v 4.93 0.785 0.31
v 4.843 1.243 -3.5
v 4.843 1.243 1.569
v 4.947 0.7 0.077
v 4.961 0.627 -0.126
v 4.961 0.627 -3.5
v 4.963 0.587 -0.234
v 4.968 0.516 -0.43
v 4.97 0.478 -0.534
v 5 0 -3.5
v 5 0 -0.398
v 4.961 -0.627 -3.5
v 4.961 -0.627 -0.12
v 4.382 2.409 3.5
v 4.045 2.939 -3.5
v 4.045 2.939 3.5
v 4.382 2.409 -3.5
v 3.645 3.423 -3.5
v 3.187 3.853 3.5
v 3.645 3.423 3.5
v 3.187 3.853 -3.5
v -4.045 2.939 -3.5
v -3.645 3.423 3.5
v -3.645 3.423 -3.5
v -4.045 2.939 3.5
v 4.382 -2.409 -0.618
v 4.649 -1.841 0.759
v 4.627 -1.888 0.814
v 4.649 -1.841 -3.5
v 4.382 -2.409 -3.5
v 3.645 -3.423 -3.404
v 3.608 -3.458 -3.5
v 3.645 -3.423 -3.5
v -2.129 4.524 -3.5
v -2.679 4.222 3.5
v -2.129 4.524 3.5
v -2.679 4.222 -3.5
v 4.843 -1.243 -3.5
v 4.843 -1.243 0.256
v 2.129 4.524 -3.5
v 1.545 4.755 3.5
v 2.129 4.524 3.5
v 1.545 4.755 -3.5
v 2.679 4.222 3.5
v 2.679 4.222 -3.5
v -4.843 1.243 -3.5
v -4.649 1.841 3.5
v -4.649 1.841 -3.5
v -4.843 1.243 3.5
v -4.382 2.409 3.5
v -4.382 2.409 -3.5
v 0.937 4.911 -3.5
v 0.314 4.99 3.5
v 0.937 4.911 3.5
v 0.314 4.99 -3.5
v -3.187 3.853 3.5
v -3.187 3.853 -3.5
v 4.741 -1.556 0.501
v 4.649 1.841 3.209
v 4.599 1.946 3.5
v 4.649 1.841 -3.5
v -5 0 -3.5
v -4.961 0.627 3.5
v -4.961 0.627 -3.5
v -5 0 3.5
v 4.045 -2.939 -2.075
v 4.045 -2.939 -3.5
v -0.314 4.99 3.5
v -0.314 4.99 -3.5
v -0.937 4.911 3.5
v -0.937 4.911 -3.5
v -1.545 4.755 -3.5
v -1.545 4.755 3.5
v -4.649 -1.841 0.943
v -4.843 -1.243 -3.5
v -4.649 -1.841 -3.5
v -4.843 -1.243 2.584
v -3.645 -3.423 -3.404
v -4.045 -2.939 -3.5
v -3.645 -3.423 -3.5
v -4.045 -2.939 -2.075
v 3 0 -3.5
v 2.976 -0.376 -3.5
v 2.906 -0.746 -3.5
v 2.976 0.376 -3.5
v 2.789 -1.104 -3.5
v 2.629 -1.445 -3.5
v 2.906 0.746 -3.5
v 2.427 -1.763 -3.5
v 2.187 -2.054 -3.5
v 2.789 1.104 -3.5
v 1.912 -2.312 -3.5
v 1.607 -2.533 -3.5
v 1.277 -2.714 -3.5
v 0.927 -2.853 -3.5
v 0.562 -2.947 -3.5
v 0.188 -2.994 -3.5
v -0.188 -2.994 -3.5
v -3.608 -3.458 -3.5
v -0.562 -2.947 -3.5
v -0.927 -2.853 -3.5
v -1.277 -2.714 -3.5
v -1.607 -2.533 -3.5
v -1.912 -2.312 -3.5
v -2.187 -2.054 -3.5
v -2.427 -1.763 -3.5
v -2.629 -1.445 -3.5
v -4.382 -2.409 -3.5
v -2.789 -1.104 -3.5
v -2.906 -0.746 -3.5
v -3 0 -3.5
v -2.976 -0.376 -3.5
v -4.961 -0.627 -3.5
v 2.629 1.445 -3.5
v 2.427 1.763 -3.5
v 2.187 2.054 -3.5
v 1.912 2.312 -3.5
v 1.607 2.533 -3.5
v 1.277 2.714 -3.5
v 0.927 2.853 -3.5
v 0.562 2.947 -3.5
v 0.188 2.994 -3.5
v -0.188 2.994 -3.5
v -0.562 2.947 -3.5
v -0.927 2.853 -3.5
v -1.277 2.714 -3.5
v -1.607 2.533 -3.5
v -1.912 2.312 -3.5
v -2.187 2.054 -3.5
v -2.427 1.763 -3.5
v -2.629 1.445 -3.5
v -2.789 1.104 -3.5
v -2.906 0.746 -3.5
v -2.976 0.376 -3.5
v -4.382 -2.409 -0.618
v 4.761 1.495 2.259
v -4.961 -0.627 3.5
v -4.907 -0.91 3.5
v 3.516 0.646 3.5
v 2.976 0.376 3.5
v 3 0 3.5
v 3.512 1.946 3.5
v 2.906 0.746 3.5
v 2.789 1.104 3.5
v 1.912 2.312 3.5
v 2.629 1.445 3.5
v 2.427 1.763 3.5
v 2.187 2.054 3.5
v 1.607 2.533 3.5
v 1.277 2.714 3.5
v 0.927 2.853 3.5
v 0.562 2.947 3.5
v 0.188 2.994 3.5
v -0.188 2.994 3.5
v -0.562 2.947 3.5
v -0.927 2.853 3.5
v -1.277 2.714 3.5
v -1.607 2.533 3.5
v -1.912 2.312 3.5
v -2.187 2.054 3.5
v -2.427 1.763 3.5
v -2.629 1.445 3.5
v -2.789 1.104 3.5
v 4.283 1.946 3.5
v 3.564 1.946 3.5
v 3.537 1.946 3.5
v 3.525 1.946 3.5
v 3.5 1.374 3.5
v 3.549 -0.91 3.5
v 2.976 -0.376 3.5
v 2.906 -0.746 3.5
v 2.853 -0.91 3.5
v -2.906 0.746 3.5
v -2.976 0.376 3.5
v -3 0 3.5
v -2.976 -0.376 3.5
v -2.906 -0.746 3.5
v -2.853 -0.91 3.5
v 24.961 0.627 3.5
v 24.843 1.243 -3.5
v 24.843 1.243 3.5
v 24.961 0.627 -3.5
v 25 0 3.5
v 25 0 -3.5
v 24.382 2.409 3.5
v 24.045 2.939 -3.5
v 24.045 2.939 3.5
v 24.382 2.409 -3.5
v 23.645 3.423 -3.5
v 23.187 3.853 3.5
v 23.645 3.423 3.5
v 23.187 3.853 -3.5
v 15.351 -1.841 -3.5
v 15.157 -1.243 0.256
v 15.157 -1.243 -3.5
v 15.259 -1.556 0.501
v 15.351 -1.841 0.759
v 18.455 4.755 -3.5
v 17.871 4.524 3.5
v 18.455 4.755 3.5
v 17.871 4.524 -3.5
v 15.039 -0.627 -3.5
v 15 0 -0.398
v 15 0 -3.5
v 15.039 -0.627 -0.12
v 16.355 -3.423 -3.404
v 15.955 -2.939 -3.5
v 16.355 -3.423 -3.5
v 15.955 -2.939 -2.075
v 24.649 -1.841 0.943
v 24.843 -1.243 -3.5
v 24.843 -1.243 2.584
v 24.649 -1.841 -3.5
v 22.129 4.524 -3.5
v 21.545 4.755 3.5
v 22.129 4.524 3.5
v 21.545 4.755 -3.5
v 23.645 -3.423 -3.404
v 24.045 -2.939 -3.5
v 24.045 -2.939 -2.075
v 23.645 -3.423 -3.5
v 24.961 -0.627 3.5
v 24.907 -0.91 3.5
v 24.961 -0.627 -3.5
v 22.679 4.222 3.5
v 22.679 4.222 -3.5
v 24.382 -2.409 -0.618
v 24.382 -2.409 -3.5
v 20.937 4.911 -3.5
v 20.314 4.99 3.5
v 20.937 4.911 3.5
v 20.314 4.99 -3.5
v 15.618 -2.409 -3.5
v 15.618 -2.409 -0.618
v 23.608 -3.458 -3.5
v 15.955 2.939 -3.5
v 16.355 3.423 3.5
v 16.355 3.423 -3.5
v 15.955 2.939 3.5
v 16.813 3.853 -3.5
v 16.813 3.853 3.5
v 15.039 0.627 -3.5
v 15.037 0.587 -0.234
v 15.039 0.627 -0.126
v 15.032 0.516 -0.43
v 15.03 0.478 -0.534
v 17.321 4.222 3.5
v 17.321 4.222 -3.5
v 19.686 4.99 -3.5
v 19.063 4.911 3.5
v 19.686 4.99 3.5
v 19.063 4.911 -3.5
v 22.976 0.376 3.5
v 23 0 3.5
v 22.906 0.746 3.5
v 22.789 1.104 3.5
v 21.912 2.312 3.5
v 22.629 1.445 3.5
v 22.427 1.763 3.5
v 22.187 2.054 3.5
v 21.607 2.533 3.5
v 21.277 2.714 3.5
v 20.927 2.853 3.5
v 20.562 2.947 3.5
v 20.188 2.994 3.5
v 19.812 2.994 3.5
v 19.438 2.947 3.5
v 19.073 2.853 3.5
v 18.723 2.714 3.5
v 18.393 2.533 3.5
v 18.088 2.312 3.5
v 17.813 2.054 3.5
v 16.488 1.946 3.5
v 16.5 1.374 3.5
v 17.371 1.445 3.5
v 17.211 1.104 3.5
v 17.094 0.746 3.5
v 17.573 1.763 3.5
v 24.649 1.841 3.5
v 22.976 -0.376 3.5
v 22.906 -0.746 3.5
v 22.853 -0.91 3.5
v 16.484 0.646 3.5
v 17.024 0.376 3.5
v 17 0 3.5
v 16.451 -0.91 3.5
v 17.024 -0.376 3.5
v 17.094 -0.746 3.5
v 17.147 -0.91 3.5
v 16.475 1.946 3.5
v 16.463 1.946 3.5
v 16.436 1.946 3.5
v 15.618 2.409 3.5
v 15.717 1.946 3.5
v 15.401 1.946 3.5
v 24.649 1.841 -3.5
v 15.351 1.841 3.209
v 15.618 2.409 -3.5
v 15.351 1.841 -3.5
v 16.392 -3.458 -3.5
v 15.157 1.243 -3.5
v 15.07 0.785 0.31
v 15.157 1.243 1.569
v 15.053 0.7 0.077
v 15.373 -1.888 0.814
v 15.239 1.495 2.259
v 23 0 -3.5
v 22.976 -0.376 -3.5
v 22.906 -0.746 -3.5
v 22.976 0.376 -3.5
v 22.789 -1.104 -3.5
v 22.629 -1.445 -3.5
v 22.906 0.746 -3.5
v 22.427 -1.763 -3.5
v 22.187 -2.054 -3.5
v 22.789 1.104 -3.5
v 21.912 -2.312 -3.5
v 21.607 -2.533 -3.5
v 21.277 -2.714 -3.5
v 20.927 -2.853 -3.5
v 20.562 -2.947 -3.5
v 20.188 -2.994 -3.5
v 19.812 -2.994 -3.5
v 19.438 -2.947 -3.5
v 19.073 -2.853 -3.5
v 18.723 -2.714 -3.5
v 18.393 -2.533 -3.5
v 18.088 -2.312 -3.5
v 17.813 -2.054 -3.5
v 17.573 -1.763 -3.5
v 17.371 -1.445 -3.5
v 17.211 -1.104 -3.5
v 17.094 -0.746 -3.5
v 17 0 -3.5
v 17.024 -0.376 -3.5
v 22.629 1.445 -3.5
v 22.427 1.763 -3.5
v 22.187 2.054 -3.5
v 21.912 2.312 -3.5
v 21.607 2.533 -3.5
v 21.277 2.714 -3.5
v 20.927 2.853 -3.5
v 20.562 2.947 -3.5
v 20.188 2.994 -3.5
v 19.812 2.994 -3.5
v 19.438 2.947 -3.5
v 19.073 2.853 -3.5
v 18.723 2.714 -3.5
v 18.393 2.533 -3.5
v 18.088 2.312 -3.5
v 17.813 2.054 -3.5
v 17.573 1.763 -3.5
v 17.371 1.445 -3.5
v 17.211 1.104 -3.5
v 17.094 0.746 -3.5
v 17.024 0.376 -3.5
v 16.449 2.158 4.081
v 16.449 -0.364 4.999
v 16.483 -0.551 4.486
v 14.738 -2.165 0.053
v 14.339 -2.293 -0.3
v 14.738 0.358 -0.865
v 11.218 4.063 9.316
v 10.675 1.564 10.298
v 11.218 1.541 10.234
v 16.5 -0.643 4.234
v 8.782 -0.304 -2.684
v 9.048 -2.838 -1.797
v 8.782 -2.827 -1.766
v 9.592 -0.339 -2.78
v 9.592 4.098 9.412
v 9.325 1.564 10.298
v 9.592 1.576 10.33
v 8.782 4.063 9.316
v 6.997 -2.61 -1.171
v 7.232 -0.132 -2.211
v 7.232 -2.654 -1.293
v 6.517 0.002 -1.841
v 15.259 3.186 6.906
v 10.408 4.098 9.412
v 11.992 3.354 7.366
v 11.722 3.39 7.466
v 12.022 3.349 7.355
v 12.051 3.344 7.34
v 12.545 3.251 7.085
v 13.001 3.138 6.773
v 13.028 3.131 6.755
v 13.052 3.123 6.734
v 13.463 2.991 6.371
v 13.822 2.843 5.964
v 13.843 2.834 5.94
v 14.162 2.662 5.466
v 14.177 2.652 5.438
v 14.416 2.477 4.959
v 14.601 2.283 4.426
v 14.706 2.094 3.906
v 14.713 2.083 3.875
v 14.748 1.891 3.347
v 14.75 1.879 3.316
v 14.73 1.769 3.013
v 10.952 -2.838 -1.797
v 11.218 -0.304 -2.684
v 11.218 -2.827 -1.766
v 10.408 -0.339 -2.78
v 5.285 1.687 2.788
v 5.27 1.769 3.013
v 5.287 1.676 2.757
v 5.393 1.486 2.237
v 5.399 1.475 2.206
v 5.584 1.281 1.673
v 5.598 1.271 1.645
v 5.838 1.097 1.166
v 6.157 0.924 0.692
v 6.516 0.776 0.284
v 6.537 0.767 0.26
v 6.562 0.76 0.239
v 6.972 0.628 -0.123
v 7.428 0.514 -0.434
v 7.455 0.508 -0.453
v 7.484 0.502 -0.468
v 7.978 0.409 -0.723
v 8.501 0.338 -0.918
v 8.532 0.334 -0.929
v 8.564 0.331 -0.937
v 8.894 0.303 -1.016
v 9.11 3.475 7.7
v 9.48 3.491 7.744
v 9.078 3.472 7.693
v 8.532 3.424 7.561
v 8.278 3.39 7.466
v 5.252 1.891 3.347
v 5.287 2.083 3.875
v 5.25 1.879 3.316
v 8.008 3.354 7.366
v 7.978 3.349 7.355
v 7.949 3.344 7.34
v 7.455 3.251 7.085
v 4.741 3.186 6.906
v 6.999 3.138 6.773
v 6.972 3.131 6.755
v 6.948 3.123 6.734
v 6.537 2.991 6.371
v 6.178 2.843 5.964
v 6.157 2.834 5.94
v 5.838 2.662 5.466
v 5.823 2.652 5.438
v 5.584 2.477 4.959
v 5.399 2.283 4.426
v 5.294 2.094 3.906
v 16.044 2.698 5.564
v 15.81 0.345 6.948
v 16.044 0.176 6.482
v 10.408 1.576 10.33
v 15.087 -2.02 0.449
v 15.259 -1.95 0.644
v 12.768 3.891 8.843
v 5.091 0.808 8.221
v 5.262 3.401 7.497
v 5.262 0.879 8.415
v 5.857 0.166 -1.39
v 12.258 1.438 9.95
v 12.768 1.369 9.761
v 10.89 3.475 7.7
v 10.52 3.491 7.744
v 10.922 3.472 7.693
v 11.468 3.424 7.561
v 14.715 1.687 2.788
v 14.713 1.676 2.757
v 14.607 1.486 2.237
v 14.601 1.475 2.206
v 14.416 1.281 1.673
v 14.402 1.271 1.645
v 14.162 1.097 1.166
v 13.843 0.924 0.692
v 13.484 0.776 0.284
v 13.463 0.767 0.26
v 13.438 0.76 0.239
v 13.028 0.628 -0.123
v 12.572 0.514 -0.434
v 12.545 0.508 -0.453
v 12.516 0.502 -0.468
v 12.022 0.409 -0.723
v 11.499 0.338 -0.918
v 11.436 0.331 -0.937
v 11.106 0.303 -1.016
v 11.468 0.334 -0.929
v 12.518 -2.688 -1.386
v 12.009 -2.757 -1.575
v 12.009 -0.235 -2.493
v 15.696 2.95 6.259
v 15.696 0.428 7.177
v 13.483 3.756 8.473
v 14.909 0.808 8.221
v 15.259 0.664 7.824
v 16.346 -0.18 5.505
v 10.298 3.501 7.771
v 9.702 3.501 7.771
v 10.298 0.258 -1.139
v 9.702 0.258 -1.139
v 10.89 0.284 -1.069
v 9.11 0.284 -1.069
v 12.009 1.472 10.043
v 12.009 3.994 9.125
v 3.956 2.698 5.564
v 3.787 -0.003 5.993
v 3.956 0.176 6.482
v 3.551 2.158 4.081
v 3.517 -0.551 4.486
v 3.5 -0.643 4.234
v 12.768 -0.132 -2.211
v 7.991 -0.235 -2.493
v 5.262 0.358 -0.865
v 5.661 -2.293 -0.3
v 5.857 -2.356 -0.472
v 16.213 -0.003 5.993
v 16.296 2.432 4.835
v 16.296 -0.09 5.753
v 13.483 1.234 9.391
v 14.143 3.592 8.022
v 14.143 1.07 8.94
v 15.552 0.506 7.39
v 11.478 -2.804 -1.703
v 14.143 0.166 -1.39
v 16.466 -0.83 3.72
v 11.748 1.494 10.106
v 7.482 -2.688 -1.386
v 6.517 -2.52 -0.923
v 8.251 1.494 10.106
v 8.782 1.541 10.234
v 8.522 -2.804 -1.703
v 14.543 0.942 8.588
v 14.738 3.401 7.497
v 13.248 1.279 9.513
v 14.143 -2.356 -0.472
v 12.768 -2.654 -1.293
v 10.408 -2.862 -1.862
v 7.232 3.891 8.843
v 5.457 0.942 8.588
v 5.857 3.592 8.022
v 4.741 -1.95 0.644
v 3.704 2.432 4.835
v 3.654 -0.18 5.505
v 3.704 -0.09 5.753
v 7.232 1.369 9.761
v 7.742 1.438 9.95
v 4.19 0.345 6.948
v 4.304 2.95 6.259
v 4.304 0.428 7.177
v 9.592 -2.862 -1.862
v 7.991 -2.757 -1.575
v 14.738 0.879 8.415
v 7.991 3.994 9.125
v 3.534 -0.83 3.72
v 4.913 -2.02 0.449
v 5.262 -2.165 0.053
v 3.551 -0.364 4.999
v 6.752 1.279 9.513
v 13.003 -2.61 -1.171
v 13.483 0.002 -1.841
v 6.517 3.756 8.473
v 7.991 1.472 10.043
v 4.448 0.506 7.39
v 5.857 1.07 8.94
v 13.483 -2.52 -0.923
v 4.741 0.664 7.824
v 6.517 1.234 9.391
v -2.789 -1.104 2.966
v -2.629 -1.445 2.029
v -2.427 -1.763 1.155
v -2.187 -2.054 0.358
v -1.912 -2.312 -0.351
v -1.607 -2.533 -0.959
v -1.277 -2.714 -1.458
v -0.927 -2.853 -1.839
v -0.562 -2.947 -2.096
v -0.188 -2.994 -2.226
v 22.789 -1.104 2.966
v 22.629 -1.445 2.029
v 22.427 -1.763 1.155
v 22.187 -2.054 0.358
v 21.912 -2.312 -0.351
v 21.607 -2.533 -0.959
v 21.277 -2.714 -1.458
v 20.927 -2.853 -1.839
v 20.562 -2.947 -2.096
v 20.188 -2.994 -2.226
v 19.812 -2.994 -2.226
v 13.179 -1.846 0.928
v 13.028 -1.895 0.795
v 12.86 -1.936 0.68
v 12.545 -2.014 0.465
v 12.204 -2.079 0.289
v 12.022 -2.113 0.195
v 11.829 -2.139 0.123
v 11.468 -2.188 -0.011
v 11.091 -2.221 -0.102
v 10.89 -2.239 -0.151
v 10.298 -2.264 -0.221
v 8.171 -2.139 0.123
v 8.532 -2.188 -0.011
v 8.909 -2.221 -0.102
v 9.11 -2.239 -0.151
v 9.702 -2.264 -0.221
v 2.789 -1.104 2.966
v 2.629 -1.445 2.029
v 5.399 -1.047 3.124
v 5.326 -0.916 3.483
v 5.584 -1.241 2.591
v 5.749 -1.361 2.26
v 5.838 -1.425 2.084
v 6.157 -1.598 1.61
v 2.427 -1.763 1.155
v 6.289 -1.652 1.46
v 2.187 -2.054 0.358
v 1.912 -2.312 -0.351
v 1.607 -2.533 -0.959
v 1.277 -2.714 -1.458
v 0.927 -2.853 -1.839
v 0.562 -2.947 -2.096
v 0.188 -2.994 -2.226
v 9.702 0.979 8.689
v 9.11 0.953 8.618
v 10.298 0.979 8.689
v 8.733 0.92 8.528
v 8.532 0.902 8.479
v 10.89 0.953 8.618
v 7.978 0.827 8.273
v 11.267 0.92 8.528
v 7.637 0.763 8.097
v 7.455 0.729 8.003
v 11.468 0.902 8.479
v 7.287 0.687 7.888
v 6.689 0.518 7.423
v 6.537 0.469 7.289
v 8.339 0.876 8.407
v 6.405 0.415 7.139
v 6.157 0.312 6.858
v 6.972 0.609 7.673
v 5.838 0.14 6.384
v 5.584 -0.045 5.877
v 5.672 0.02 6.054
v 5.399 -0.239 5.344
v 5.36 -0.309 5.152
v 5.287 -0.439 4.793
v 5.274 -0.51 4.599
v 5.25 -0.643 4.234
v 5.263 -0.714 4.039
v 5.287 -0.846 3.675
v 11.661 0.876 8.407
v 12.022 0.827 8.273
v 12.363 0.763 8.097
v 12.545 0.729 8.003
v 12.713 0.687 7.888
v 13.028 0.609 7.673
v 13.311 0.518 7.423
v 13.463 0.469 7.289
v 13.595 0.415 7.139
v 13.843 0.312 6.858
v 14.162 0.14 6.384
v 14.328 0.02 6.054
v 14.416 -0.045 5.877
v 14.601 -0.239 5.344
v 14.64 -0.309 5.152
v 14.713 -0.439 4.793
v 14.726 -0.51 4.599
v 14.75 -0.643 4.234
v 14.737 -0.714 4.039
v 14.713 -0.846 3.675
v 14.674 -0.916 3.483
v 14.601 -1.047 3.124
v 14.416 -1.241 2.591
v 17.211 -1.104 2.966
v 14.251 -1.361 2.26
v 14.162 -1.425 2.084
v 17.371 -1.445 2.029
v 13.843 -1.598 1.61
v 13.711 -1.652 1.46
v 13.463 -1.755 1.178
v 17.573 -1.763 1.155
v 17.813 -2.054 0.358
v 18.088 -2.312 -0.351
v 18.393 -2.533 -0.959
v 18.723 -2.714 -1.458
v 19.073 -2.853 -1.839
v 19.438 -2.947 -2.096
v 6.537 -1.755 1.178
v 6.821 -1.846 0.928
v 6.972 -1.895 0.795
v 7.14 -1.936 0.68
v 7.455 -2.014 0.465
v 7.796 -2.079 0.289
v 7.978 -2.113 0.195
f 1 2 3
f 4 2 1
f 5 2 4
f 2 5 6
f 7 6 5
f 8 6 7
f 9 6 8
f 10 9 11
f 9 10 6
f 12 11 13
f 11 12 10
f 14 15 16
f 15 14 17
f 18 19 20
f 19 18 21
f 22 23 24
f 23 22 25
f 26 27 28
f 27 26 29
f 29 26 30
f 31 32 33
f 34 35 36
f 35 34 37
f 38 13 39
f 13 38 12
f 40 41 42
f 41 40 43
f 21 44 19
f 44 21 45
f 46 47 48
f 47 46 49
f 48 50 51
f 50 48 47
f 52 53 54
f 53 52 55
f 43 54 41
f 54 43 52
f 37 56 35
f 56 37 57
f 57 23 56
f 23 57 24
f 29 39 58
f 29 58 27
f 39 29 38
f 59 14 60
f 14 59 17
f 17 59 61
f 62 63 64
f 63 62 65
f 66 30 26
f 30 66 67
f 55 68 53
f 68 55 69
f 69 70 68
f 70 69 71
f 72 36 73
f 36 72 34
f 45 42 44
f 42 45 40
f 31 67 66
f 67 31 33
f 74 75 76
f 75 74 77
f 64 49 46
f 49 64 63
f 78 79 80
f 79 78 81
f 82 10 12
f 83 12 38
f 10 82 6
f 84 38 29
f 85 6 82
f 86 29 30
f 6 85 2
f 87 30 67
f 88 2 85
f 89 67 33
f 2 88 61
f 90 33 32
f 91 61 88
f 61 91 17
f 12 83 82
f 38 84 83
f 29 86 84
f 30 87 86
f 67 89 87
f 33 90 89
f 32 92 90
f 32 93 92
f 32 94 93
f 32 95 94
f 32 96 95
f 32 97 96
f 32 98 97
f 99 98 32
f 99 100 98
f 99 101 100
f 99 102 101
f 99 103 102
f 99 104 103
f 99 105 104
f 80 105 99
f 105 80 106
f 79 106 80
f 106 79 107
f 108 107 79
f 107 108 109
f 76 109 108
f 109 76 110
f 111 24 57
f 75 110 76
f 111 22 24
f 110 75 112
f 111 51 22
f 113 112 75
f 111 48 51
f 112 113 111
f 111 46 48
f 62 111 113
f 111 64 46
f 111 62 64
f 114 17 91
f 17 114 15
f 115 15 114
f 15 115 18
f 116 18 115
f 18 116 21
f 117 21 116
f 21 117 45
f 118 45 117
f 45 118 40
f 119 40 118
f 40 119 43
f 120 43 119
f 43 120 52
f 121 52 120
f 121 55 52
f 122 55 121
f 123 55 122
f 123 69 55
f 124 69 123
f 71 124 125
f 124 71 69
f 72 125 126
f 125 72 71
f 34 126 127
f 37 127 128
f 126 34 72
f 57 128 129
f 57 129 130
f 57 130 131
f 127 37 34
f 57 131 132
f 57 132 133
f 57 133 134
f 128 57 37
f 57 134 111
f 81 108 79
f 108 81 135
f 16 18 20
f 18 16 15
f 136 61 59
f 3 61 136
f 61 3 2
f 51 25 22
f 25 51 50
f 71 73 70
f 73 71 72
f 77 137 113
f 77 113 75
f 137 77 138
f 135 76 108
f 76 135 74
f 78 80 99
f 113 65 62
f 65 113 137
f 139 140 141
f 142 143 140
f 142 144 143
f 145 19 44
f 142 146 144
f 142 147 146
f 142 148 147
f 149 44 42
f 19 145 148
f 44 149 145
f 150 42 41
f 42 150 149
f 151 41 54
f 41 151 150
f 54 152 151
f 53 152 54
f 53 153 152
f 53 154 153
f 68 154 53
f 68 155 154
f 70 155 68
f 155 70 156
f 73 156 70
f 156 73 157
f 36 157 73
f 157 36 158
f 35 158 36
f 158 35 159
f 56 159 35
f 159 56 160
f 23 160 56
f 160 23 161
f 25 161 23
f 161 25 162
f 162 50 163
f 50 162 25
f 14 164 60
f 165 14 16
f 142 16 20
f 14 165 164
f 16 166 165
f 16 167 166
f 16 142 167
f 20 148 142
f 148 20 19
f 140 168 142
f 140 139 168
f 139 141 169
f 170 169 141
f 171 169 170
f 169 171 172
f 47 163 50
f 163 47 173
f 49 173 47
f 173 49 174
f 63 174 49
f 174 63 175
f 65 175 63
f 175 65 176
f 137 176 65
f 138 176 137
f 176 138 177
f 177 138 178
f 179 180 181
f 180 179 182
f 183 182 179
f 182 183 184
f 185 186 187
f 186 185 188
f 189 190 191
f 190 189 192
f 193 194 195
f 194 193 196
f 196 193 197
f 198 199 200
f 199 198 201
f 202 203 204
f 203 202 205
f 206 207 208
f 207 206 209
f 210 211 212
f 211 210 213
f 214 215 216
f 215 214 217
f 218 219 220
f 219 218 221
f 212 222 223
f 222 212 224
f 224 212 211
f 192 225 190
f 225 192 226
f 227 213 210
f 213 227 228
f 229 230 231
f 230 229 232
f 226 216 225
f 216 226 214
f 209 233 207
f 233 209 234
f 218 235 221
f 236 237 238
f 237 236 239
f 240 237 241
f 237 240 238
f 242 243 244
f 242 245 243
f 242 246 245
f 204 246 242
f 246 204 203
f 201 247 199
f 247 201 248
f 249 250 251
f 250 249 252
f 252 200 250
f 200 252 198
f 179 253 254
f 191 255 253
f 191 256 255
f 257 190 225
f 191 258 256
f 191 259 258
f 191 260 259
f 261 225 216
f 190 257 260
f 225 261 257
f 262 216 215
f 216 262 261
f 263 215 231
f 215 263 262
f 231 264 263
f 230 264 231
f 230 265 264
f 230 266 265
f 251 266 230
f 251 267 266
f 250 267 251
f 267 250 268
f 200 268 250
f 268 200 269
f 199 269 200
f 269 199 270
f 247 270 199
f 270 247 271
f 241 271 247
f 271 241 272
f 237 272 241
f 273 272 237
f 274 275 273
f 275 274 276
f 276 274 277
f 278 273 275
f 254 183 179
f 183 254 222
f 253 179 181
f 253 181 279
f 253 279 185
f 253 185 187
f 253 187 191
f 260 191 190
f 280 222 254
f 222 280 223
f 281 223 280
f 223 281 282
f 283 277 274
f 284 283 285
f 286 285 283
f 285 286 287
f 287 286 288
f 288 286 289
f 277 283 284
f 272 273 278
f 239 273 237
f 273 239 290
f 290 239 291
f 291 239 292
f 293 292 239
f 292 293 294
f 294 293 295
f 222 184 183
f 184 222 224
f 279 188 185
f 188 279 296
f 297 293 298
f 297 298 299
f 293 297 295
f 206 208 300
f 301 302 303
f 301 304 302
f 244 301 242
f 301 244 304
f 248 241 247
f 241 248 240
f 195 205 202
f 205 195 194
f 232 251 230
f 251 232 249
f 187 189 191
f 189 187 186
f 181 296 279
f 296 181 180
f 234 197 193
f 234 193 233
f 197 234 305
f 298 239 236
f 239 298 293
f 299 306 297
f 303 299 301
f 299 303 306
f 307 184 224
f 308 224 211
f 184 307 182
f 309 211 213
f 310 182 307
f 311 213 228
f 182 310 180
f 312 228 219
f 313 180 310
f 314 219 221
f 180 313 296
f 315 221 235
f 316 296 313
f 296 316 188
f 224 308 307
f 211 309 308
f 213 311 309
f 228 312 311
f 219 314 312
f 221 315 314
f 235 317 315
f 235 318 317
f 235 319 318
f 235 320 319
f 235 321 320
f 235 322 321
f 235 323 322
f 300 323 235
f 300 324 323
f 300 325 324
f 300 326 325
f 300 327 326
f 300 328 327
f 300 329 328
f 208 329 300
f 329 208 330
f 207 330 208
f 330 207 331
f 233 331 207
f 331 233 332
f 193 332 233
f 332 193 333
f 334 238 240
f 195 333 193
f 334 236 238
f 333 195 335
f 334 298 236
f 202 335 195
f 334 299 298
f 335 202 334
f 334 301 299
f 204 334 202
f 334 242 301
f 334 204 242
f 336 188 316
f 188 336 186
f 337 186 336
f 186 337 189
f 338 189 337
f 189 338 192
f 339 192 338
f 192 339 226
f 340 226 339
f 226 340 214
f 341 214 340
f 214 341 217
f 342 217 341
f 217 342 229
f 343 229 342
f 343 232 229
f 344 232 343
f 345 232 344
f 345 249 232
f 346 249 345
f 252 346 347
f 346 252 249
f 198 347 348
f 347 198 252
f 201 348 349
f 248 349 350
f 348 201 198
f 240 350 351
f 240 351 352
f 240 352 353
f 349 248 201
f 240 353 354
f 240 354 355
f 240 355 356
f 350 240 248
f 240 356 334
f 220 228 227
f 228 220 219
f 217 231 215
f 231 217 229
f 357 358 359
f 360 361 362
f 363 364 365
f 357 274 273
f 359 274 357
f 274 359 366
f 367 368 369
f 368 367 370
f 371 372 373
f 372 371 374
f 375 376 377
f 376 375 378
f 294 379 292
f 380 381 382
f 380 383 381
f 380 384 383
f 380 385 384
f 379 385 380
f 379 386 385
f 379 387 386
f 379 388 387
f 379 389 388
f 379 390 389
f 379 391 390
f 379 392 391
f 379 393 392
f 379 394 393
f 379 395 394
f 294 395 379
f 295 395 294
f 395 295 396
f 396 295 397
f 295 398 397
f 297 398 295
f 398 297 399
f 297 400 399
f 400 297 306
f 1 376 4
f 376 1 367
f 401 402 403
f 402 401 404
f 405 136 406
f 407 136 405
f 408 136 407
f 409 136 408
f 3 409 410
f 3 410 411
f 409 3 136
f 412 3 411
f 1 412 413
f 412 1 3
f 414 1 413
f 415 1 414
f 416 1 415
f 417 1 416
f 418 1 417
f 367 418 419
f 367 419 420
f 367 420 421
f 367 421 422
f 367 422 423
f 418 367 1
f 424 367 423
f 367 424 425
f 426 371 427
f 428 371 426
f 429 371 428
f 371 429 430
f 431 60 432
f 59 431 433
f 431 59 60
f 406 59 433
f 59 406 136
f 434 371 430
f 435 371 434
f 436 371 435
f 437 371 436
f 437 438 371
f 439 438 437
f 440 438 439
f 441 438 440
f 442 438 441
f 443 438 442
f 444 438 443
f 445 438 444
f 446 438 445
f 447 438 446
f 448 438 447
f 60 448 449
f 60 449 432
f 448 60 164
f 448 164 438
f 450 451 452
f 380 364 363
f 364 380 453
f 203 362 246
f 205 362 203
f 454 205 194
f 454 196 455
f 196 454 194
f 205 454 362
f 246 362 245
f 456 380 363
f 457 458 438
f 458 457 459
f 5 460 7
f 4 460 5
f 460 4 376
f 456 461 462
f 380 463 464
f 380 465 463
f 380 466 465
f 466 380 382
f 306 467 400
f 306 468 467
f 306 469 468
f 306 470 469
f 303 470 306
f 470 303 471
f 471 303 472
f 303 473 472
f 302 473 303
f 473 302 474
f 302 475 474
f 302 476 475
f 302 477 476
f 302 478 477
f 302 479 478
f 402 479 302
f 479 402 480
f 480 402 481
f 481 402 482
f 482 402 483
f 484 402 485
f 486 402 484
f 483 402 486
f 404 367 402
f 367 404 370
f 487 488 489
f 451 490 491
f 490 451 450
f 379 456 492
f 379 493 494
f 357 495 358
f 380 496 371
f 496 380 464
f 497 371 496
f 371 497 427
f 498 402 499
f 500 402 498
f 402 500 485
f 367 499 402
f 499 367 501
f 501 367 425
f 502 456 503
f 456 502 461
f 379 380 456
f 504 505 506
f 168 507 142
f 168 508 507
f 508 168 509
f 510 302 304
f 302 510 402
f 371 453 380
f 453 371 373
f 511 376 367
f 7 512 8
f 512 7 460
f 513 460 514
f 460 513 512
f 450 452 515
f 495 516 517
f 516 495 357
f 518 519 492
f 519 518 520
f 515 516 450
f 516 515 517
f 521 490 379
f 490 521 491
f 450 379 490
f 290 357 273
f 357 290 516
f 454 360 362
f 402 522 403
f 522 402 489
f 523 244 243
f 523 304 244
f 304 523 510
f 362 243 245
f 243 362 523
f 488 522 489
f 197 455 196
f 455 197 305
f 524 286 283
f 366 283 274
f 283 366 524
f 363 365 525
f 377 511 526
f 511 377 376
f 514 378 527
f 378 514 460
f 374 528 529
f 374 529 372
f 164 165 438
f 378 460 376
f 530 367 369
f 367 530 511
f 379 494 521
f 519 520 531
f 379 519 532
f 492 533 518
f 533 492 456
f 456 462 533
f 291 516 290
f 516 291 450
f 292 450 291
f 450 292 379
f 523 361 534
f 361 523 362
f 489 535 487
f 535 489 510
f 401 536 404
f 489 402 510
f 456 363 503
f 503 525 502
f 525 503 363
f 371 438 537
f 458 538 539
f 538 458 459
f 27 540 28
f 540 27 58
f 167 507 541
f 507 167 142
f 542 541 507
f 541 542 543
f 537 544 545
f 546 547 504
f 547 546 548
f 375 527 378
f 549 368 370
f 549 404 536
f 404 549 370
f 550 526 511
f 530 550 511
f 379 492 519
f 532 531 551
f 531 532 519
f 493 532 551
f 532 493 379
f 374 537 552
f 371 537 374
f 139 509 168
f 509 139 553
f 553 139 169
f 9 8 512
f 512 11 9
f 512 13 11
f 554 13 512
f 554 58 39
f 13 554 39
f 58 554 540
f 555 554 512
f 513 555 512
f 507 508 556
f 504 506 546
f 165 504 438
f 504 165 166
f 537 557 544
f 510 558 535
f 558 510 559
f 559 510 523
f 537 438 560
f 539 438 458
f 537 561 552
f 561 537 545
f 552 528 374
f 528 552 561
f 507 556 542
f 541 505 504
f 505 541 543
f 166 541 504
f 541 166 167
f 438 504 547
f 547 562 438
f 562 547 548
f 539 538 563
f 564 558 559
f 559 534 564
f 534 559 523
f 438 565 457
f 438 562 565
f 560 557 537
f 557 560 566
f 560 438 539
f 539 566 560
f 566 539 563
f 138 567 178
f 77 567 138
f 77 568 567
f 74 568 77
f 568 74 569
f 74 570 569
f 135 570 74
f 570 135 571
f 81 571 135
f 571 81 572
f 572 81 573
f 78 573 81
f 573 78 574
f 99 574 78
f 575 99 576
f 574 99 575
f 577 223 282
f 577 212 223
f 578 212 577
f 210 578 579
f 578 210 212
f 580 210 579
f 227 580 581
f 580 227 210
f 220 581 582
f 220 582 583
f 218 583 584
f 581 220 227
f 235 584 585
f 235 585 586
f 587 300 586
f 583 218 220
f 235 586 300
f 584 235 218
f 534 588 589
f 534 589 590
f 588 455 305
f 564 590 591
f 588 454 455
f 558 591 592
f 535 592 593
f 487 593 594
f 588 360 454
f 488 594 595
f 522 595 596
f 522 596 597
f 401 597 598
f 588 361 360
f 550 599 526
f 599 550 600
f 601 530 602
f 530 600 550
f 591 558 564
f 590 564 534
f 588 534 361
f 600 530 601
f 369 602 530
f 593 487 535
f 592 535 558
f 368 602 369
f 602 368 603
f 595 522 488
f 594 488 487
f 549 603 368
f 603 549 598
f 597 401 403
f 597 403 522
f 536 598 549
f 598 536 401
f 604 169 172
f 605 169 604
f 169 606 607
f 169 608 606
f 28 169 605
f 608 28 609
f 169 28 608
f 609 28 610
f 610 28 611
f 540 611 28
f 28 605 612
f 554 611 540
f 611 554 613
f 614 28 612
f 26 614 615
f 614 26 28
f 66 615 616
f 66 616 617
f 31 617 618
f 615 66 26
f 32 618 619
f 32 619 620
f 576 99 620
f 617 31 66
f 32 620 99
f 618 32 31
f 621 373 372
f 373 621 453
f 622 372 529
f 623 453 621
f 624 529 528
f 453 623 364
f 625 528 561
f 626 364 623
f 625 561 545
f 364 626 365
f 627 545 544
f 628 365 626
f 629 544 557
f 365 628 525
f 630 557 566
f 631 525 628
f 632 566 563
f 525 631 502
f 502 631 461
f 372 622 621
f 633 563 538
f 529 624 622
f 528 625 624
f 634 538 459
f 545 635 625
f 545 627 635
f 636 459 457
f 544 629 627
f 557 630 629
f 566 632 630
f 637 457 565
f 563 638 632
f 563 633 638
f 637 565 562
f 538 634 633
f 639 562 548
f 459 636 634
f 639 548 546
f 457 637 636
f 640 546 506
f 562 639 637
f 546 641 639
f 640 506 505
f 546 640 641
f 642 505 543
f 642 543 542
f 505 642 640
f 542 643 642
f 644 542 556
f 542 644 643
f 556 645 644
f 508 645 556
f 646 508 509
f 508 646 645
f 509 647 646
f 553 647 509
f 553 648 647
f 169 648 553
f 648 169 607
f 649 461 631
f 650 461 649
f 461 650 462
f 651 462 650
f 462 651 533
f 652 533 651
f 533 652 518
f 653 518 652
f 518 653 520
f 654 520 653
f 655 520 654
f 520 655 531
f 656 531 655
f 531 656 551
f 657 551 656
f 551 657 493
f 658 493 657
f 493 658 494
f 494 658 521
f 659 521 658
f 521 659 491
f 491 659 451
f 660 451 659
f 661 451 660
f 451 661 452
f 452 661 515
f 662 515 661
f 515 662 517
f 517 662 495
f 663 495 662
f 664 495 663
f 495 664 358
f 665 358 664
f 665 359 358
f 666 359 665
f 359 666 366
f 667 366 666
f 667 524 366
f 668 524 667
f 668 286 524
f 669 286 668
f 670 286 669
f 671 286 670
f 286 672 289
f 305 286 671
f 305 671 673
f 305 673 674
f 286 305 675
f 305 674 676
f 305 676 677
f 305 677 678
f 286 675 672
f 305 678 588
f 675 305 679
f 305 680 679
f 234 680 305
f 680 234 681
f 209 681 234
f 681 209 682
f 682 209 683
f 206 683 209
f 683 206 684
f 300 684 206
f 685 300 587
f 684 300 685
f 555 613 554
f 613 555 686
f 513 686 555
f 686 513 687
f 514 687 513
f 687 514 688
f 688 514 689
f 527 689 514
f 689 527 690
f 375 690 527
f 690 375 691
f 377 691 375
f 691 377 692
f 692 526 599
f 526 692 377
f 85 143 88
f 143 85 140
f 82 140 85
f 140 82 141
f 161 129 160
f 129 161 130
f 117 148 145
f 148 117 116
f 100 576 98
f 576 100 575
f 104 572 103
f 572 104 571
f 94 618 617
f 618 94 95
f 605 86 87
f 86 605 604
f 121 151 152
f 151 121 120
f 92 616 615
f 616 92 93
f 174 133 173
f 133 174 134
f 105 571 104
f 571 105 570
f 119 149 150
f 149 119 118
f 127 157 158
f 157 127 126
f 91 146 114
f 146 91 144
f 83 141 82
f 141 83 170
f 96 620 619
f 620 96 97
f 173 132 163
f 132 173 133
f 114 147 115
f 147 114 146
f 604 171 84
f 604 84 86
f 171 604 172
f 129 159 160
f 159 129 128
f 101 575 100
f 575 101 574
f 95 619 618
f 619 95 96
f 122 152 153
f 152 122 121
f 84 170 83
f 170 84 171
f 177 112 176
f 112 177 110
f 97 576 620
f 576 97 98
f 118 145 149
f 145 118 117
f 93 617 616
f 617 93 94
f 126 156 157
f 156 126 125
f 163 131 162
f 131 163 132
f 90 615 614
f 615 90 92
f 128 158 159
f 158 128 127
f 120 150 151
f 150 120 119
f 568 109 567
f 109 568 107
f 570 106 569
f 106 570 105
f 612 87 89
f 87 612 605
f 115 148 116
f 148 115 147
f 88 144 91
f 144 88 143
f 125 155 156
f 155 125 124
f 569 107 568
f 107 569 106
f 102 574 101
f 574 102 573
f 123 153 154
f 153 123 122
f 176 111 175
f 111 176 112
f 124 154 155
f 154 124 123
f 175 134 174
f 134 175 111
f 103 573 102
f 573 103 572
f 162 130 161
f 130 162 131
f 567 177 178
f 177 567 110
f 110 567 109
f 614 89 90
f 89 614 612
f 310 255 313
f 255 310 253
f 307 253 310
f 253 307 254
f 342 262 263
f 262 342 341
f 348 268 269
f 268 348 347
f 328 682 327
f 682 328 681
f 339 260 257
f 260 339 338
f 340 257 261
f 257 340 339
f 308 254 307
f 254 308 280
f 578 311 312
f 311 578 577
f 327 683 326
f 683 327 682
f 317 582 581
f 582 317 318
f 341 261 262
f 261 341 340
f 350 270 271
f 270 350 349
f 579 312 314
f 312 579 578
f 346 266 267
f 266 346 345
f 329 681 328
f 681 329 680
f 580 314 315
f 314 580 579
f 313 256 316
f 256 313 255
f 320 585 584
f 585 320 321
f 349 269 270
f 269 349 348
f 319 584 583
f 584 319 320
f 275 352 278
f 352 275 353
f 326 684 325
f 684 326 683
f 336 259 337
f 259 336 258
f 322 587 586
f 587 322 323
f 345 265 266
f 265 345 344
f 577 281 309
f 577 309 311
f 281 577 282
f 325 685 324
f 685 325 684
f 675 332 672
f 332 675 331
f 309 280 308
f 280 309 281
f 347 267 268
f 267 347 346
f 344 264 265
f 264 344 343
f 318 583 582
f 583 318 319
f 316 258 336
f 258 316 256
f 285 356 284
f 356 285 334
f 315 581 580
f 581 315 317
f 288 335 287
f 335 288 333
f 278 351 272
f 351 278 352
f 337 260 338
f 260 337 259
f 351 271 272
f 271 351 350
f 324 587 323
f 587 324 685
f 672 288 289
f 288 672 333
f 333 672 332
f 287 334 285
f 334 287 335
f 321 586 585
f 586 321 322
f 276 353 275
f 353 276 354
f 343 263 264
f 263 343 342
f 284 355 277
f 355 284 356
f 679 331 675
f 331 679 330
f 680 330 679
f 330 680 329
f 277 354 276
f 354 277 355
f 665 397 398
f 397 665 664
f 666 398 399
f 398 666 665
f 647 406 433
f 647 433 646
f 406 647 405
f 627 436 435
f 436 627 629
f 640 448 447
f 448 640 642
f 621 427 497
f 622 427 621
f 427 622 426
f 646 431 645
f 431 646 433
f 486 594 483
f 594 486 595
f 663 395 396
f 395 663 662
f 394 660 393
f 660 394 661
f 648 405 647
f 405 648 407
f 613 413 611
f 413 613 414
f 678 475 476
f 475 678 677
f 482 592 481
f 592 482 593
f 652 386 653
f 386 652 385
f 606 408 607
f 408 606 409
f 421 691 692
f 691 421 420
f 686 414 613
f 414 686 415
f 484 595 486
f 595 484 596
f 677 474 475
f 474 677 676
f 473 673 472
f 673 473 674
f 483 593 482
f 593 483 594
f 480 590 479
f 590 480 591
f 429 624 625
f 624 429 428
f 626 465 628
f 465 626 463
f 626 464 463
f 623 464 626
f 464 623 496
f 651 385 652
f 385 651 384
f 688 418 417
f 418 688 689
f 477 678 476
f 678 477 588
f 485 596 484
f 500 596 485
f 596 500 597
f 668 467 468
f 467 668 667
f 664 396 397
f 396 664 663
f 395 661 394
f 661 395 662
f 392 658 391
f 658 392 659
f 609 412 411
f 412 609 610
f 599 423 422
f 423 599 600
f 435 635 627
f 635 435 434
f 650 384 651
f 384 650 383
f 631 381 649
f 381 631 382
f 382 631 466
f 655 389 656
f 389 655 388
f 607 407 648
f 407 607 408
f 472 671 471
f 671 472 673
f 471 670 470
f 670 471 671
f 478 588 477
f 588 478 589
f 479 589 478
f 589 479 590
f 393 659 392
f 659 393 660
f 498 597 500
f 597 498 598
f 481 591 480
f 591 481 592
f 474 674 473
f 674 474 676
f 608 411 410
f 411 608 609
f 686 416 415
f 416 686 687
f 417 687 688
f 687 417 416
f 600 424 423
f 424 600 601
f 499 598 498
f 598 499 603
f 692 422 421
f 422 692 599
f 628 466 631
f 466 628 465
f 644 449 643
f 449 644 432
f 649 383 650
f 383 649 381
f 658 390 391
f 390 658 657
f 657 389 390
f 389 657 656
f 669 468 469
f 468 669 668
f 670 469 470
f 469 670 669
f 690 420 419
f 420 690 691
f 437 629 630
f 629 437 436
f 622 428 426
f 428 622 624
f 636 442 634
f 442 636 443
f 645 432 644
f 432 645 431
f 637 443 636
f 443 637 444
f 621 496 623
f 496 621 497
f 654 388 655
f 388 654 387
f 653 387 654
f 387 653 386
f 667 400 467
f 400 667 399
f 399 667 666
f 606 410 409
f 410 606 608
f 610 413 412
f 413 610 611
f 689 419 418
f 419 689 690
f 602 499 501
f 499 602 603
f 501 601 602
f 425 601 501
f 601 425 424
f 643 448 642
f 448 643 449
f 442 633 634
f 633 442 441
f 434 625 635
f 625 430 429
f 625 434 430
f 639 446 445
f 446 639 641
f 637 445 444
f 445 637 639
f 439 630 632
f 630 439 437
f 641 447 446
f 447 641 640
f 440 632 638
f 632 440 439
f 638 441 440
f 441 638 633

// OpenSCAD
//U120 Cam mount
//Designed based on the original one but from scratch and customizable

cam_angle=20;
cam_height=4;
cam_hole=9.5;
cam_offset_y=0;
cam_width=13;

cut=0.5;
cutout_size=30;

$fn=50;


//U120
standoff_height=7;
standoff_width=10;
standoff_hole=6;
standoff_distance=20;

cam_offset_z=cam_height*0.5+2;
total_height=15;

difference() {
    union() {
        //left standoff
        cylinder(d=standoff_width,h=standoff_height,center=true);
        //rightstandoff
        translate([standoff_distance,0,0])
            cylinder(d=standoff_width,h=standoff_height,center=true);
            
        //cam
        translate([standoff_distance*0.5,cam_offset_y,cam_offset_z])
            rotate([90-cam_angle,0,0])
                cylinder(d=cam_width,h=cam_height,center=true);

    }

    union() {
        //cut out angle for printing
        translate([-standoff_width,cam_offset_y,cam_height*0.5+cam_offset_z])
            rotate([90-cam_angle,0,0])
                translate([0,-cutout_size*0.5,0])
                    cube([standoff_distance*2,cutout_size,20],center=false);
        
        //holes
        
        //left standoff
        cylinder(d=standoff_hole,h=standoff_height+cut,center=true);
        
        //right standoff
        translate([standoff_distance,0,0])
            cylinder(d=standoff_hole,h=standoff_height+cut,center=true);
            
        //cam
        translate([standoff_distance*0.5,cam_offset_y,cam_offset_z])
            rotate([90-cam_angle,0,0])
                cylinder(d=cam_hole,h=cam_height+cut,center=true);
    }
}
